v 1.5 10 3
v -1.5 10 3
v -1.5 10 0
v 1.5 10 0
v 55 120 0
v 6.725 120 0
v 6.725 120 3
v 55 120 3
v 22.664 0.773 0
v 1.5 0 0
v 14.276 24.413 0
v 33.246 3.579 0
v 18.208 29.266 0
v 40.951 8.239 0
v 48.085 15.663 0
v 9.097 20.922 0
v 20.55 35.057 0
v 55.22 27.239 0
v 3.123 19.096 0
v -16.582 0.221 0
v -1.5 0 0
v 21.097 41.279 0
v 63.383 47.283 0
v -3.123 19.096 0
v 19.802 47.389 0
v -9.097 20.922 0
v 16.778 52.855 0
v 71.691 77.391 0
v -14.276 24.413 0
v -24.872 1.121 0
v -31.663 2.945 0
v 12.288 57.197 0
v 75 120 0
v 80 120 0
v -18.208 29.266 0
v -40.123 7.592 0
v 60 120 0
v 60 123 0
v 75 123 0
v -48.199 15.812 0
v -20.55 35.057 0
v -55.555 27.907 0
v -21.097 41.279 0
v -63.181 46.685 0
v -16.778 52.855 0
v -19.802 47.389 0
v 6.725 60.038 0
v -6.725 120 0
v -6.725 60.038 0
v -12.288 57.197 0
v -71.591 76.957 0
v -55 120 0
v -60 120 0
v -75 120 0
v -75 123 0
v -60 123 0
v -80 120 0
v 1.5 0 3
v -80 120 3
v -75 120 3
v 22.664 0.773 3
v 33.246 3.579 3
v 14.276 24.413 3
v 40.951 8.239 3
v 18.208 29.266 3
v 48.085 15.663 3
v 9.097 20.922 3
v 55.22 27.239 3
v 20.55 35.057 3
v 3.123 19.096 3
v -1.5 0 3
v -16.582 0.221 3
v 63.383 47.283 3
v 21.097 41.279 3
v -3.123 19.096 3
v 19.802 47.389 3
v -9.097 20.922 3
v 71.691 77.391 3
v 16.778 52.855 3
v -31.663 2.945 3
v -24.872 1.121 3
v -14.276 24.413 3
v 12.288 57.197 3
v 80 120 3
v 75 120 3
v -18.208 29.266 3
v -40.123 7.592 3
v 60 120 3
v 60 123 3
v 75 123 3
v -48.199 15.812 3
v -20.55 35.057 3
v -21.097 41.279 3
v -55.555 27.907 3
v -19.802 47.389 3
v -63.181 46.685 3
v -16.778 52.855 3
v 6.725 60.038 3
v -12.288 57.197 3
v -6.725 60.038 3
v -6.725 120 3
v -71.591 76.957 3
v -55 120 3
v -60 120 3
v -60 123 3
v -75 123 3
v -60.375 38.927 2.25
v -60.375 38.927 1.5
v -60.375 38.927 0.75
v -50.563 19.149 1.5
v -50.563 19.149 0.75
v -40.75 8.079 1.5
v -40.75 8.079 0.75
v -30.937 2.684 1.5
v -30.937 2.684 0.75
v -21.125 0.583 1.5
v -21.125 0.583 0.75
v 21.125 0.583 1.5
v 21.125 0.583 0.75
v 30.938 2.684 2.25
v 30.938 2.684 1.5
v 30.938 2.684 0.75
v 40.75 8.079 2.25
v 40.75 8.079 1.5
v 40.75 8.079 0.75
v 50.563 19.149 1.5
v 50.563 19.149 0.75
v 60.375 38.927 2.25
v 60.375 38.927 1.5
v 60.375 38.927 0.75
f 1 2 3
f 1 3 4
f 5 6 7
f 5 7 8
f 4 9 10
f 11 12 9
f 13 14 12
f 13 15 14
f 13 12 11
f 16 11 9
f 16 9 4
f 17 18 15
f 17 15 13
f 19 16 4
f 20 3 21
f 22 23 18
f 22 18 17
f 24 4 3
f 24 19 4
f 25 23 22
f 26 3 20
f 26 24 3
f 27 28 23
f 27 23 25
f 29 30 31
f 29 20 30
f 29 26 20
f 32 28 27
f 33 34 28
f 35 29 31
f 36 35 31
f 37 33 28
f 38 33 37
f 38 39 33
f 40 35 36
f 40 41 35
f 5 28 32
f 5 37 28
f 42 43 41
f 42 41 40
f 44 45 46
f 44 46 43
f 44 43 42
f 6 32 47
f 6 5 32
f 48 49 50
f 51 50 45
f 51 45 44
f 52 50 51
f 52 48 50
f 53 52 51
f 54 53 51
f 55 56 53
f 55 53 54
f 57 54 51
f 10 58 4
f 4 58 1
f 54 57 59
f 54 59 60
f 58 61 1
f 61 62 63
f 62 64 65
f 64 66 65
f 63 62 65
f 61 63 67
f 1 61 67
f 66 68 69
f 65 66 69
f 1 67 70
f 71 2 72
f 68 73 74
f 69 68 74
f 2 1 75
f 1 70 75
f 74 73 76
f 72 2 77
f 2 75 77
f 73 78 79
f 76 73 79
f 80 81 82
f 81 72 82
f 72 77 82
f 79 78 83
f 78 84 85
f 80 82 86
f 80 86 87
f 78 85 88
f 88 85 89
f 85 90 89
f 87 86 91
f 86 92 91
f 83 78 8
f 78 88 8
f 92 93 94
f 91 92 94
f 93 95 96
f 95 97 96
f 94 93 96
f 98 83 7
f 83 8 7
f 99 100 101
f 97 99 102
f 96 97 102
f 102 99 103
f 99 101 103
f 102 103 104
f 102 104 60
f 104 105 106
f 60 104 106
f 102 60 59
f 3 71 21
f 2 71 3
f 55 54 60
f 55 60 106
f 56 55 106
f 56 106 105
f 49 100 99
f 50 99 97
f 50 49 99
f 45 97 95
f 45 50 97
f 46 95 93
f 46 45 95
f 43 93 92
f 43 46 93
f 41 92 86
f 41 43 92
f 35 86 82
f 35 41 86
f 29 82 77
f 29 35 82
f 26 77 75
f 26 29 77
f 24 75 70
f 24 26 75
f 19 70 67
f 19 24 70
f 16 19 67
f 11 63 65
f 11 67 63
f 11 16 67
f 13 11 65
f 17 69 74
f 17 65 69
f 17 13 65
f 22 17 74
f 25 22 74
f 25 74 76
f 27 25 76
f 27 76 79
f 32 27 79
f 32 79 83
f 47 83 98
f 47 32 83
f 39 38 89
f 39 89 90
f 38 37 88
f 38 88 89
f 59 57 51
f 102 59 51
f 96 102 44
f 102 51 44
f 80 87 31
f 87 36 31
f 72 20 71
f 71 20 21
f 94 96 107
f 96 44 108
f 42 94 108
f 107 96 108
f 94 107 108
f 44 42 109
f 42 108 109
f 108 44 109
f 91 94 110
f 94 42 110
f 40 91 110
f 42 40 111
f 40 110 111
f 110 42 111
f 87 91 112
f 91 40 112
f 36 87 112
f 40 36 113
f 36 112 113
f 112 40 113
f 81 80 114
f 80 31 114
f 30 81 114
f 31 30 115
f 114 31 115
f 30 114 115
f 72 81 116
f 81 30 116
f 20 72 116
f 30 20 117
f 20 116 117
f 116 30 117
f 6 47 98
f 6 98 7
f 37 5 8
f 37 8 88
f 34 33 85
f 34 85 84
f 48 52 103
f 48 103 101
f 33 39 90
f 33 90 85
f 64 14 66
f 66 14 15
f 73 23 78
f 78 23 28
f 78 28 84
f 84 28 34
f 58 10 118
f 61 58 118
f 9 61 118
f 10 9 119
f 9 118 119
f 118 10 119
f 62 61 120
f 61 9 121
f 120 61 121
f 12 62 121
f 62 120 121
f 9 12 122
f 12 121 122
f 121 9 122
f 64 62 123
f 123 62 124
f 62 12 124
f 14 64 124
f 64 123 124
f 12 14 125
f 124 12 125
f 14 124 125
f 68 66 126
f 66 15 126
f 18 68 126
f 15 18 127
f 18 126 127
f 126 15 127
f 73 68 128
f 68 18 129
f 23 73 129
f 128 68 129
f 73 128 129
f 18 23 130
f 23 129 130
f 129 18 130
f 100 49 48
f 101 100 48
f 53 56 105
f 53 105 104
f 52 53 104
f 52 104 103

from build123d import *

# Parameters (mm, degrees)
EXTRUDE_1_DEPTH     = 3
EXTRUDE_2_DEPTH     = 3
SKETCH_3_W          = 13.450237246
SKETCH_3_H          = 65.000975664
CUT_EXTRUDE_1_DEPTH = 3
SKETCH_4_R          = 21.136087039
CUT_EXTRUDE_2_DEPTH = 3
SKETCH_5_W          = 3
SKETCH_5_H          = 15.975910133
CUT_EXTRUDE_4_DEPTH = 10


with BuildPart() as part:
    # 草图1 → 凸台-拉伸1 (new body)
    with BuildSketch(Plane.XY):
        with BuildLine():
            Line((-80.000000005, 119.999999901), (-75.000000001, 119.999999901))
            Line((-75.000000001, 119.999999901), (-75.000000001, 123.000000024))
            Line((-75.000000001, 123.000000024), (-60, 123.000000024))
            Line((-60, 123.000000024), (-60, 120.000000041))
            Line((-60, 120.000000041), (-55, 120.000000041))
            add(Edge.make_bspline(
                [(-55, 120.000000041), (-34.848967069, 68.706461628), (-14.697934131, 54.999024377)],
                knots=[0, 0, 0, 0.366382417, 0.366382417, 0.366382417], degree=2))
            ThreePointArc((-14.697934131, 54.999024377), (1e-09, 19), (14.69793413, 54.999024379))
            add(Edge.make_bspline(
                [(14.69793413, 54.999024379), (34.848967062, 68.706461624), (55, 119.999999995)],
                knots=[0.633617583, 0.633617583, 0.633617583, 1, 1, 1], degree=2))
            Line((55, 119.999999995), (60, 119.999999995))
            Line((60, 119.999999995), (60, 123.000000213))
            Line((60, 123.000000213), (75.00000006, 123.000000213))
            Line((75.00000006, 123.000000213), (75.00000006, 120.000000262))
            Line((75.00000006, 120.000000262), (80.000000064, 120.000000262))
            add(Edge.make_bspline(
                [(-80.000000005, 119.999999901), (-39.999999975, -120.000000248), (2.9e-08, 120.000000083), (40.000000059, -120.000000419), (80.000000064, 120.000000262)],
                knots=[0.028854322, 0.028854322, 0.028854322, 0.028854322, 0.028854322, 0.971145678, 0.971145678, 0.971145678, 0.971145678, 0.971145678], degree=4))
        make_face()
    extrude(amount=EXTRUDE_1_DEPTH)

    # 草图2 → 凸台-拉伸2 (add)
    with BuildSketch(Plane.XY):
        with BuildLine():
            Line((-55, 120.000000041), (55, 119.999999995))
            add(Edge.make_bspline(
                [(14.69793413, 54.999024379), (34.848967062, 68.706461624), (55, 119.999999995)],
                knots=[0, 0, 0, 1, 1, 1], degree=2))
            Line((14.69793413, 54.999024379), (-14.697934131, 54.999024377))
            add(Edge.make_bspline(
                [(-55, 120.000000041), (-34.848967069, 68.706461628), (-14.697934131, 54.999024377)],
                knots=[0, 0, 0, 1, 1, 1], degree=2))
        make_face()
    extrude(amount=EXTRUDE_2_DEPTH)

    # 草图3 → 切除-拉伸1 (cut)
    with BuildSketch(Plane.XY):
        with Locations((0, 87.499512209)):
            Rectangle(SKETCH_3_W, SKETCH_3_H)
    extrude(amount=CUT_EXTRUDE_1_DEPTH, mode=Mode.SUBTRACT)

    # 草图4 → 切除-拉伸2 (cut)
    with BuildSketch(Plane.XY):
        with Locations((0, 40)):
            Circle(SKETCH_4_R)
    extrude(amount=CUT_EXTRUDE_2_DEPTH, mode=Mode.SUBTRACT)

    # 草图5 → 切除-拉伸4 (cut)
    with BuildSketch(Plane.XY.offset(3)):
        with Locations((0, 2.012044933)):
            Rectangle(SKETCH_5_W, SKETCH_5_H)
    extrude(amount=-CUT_EXTRUDE_4_DEPTH, mode=Mode.SUBTRACT)


solid = part.part
